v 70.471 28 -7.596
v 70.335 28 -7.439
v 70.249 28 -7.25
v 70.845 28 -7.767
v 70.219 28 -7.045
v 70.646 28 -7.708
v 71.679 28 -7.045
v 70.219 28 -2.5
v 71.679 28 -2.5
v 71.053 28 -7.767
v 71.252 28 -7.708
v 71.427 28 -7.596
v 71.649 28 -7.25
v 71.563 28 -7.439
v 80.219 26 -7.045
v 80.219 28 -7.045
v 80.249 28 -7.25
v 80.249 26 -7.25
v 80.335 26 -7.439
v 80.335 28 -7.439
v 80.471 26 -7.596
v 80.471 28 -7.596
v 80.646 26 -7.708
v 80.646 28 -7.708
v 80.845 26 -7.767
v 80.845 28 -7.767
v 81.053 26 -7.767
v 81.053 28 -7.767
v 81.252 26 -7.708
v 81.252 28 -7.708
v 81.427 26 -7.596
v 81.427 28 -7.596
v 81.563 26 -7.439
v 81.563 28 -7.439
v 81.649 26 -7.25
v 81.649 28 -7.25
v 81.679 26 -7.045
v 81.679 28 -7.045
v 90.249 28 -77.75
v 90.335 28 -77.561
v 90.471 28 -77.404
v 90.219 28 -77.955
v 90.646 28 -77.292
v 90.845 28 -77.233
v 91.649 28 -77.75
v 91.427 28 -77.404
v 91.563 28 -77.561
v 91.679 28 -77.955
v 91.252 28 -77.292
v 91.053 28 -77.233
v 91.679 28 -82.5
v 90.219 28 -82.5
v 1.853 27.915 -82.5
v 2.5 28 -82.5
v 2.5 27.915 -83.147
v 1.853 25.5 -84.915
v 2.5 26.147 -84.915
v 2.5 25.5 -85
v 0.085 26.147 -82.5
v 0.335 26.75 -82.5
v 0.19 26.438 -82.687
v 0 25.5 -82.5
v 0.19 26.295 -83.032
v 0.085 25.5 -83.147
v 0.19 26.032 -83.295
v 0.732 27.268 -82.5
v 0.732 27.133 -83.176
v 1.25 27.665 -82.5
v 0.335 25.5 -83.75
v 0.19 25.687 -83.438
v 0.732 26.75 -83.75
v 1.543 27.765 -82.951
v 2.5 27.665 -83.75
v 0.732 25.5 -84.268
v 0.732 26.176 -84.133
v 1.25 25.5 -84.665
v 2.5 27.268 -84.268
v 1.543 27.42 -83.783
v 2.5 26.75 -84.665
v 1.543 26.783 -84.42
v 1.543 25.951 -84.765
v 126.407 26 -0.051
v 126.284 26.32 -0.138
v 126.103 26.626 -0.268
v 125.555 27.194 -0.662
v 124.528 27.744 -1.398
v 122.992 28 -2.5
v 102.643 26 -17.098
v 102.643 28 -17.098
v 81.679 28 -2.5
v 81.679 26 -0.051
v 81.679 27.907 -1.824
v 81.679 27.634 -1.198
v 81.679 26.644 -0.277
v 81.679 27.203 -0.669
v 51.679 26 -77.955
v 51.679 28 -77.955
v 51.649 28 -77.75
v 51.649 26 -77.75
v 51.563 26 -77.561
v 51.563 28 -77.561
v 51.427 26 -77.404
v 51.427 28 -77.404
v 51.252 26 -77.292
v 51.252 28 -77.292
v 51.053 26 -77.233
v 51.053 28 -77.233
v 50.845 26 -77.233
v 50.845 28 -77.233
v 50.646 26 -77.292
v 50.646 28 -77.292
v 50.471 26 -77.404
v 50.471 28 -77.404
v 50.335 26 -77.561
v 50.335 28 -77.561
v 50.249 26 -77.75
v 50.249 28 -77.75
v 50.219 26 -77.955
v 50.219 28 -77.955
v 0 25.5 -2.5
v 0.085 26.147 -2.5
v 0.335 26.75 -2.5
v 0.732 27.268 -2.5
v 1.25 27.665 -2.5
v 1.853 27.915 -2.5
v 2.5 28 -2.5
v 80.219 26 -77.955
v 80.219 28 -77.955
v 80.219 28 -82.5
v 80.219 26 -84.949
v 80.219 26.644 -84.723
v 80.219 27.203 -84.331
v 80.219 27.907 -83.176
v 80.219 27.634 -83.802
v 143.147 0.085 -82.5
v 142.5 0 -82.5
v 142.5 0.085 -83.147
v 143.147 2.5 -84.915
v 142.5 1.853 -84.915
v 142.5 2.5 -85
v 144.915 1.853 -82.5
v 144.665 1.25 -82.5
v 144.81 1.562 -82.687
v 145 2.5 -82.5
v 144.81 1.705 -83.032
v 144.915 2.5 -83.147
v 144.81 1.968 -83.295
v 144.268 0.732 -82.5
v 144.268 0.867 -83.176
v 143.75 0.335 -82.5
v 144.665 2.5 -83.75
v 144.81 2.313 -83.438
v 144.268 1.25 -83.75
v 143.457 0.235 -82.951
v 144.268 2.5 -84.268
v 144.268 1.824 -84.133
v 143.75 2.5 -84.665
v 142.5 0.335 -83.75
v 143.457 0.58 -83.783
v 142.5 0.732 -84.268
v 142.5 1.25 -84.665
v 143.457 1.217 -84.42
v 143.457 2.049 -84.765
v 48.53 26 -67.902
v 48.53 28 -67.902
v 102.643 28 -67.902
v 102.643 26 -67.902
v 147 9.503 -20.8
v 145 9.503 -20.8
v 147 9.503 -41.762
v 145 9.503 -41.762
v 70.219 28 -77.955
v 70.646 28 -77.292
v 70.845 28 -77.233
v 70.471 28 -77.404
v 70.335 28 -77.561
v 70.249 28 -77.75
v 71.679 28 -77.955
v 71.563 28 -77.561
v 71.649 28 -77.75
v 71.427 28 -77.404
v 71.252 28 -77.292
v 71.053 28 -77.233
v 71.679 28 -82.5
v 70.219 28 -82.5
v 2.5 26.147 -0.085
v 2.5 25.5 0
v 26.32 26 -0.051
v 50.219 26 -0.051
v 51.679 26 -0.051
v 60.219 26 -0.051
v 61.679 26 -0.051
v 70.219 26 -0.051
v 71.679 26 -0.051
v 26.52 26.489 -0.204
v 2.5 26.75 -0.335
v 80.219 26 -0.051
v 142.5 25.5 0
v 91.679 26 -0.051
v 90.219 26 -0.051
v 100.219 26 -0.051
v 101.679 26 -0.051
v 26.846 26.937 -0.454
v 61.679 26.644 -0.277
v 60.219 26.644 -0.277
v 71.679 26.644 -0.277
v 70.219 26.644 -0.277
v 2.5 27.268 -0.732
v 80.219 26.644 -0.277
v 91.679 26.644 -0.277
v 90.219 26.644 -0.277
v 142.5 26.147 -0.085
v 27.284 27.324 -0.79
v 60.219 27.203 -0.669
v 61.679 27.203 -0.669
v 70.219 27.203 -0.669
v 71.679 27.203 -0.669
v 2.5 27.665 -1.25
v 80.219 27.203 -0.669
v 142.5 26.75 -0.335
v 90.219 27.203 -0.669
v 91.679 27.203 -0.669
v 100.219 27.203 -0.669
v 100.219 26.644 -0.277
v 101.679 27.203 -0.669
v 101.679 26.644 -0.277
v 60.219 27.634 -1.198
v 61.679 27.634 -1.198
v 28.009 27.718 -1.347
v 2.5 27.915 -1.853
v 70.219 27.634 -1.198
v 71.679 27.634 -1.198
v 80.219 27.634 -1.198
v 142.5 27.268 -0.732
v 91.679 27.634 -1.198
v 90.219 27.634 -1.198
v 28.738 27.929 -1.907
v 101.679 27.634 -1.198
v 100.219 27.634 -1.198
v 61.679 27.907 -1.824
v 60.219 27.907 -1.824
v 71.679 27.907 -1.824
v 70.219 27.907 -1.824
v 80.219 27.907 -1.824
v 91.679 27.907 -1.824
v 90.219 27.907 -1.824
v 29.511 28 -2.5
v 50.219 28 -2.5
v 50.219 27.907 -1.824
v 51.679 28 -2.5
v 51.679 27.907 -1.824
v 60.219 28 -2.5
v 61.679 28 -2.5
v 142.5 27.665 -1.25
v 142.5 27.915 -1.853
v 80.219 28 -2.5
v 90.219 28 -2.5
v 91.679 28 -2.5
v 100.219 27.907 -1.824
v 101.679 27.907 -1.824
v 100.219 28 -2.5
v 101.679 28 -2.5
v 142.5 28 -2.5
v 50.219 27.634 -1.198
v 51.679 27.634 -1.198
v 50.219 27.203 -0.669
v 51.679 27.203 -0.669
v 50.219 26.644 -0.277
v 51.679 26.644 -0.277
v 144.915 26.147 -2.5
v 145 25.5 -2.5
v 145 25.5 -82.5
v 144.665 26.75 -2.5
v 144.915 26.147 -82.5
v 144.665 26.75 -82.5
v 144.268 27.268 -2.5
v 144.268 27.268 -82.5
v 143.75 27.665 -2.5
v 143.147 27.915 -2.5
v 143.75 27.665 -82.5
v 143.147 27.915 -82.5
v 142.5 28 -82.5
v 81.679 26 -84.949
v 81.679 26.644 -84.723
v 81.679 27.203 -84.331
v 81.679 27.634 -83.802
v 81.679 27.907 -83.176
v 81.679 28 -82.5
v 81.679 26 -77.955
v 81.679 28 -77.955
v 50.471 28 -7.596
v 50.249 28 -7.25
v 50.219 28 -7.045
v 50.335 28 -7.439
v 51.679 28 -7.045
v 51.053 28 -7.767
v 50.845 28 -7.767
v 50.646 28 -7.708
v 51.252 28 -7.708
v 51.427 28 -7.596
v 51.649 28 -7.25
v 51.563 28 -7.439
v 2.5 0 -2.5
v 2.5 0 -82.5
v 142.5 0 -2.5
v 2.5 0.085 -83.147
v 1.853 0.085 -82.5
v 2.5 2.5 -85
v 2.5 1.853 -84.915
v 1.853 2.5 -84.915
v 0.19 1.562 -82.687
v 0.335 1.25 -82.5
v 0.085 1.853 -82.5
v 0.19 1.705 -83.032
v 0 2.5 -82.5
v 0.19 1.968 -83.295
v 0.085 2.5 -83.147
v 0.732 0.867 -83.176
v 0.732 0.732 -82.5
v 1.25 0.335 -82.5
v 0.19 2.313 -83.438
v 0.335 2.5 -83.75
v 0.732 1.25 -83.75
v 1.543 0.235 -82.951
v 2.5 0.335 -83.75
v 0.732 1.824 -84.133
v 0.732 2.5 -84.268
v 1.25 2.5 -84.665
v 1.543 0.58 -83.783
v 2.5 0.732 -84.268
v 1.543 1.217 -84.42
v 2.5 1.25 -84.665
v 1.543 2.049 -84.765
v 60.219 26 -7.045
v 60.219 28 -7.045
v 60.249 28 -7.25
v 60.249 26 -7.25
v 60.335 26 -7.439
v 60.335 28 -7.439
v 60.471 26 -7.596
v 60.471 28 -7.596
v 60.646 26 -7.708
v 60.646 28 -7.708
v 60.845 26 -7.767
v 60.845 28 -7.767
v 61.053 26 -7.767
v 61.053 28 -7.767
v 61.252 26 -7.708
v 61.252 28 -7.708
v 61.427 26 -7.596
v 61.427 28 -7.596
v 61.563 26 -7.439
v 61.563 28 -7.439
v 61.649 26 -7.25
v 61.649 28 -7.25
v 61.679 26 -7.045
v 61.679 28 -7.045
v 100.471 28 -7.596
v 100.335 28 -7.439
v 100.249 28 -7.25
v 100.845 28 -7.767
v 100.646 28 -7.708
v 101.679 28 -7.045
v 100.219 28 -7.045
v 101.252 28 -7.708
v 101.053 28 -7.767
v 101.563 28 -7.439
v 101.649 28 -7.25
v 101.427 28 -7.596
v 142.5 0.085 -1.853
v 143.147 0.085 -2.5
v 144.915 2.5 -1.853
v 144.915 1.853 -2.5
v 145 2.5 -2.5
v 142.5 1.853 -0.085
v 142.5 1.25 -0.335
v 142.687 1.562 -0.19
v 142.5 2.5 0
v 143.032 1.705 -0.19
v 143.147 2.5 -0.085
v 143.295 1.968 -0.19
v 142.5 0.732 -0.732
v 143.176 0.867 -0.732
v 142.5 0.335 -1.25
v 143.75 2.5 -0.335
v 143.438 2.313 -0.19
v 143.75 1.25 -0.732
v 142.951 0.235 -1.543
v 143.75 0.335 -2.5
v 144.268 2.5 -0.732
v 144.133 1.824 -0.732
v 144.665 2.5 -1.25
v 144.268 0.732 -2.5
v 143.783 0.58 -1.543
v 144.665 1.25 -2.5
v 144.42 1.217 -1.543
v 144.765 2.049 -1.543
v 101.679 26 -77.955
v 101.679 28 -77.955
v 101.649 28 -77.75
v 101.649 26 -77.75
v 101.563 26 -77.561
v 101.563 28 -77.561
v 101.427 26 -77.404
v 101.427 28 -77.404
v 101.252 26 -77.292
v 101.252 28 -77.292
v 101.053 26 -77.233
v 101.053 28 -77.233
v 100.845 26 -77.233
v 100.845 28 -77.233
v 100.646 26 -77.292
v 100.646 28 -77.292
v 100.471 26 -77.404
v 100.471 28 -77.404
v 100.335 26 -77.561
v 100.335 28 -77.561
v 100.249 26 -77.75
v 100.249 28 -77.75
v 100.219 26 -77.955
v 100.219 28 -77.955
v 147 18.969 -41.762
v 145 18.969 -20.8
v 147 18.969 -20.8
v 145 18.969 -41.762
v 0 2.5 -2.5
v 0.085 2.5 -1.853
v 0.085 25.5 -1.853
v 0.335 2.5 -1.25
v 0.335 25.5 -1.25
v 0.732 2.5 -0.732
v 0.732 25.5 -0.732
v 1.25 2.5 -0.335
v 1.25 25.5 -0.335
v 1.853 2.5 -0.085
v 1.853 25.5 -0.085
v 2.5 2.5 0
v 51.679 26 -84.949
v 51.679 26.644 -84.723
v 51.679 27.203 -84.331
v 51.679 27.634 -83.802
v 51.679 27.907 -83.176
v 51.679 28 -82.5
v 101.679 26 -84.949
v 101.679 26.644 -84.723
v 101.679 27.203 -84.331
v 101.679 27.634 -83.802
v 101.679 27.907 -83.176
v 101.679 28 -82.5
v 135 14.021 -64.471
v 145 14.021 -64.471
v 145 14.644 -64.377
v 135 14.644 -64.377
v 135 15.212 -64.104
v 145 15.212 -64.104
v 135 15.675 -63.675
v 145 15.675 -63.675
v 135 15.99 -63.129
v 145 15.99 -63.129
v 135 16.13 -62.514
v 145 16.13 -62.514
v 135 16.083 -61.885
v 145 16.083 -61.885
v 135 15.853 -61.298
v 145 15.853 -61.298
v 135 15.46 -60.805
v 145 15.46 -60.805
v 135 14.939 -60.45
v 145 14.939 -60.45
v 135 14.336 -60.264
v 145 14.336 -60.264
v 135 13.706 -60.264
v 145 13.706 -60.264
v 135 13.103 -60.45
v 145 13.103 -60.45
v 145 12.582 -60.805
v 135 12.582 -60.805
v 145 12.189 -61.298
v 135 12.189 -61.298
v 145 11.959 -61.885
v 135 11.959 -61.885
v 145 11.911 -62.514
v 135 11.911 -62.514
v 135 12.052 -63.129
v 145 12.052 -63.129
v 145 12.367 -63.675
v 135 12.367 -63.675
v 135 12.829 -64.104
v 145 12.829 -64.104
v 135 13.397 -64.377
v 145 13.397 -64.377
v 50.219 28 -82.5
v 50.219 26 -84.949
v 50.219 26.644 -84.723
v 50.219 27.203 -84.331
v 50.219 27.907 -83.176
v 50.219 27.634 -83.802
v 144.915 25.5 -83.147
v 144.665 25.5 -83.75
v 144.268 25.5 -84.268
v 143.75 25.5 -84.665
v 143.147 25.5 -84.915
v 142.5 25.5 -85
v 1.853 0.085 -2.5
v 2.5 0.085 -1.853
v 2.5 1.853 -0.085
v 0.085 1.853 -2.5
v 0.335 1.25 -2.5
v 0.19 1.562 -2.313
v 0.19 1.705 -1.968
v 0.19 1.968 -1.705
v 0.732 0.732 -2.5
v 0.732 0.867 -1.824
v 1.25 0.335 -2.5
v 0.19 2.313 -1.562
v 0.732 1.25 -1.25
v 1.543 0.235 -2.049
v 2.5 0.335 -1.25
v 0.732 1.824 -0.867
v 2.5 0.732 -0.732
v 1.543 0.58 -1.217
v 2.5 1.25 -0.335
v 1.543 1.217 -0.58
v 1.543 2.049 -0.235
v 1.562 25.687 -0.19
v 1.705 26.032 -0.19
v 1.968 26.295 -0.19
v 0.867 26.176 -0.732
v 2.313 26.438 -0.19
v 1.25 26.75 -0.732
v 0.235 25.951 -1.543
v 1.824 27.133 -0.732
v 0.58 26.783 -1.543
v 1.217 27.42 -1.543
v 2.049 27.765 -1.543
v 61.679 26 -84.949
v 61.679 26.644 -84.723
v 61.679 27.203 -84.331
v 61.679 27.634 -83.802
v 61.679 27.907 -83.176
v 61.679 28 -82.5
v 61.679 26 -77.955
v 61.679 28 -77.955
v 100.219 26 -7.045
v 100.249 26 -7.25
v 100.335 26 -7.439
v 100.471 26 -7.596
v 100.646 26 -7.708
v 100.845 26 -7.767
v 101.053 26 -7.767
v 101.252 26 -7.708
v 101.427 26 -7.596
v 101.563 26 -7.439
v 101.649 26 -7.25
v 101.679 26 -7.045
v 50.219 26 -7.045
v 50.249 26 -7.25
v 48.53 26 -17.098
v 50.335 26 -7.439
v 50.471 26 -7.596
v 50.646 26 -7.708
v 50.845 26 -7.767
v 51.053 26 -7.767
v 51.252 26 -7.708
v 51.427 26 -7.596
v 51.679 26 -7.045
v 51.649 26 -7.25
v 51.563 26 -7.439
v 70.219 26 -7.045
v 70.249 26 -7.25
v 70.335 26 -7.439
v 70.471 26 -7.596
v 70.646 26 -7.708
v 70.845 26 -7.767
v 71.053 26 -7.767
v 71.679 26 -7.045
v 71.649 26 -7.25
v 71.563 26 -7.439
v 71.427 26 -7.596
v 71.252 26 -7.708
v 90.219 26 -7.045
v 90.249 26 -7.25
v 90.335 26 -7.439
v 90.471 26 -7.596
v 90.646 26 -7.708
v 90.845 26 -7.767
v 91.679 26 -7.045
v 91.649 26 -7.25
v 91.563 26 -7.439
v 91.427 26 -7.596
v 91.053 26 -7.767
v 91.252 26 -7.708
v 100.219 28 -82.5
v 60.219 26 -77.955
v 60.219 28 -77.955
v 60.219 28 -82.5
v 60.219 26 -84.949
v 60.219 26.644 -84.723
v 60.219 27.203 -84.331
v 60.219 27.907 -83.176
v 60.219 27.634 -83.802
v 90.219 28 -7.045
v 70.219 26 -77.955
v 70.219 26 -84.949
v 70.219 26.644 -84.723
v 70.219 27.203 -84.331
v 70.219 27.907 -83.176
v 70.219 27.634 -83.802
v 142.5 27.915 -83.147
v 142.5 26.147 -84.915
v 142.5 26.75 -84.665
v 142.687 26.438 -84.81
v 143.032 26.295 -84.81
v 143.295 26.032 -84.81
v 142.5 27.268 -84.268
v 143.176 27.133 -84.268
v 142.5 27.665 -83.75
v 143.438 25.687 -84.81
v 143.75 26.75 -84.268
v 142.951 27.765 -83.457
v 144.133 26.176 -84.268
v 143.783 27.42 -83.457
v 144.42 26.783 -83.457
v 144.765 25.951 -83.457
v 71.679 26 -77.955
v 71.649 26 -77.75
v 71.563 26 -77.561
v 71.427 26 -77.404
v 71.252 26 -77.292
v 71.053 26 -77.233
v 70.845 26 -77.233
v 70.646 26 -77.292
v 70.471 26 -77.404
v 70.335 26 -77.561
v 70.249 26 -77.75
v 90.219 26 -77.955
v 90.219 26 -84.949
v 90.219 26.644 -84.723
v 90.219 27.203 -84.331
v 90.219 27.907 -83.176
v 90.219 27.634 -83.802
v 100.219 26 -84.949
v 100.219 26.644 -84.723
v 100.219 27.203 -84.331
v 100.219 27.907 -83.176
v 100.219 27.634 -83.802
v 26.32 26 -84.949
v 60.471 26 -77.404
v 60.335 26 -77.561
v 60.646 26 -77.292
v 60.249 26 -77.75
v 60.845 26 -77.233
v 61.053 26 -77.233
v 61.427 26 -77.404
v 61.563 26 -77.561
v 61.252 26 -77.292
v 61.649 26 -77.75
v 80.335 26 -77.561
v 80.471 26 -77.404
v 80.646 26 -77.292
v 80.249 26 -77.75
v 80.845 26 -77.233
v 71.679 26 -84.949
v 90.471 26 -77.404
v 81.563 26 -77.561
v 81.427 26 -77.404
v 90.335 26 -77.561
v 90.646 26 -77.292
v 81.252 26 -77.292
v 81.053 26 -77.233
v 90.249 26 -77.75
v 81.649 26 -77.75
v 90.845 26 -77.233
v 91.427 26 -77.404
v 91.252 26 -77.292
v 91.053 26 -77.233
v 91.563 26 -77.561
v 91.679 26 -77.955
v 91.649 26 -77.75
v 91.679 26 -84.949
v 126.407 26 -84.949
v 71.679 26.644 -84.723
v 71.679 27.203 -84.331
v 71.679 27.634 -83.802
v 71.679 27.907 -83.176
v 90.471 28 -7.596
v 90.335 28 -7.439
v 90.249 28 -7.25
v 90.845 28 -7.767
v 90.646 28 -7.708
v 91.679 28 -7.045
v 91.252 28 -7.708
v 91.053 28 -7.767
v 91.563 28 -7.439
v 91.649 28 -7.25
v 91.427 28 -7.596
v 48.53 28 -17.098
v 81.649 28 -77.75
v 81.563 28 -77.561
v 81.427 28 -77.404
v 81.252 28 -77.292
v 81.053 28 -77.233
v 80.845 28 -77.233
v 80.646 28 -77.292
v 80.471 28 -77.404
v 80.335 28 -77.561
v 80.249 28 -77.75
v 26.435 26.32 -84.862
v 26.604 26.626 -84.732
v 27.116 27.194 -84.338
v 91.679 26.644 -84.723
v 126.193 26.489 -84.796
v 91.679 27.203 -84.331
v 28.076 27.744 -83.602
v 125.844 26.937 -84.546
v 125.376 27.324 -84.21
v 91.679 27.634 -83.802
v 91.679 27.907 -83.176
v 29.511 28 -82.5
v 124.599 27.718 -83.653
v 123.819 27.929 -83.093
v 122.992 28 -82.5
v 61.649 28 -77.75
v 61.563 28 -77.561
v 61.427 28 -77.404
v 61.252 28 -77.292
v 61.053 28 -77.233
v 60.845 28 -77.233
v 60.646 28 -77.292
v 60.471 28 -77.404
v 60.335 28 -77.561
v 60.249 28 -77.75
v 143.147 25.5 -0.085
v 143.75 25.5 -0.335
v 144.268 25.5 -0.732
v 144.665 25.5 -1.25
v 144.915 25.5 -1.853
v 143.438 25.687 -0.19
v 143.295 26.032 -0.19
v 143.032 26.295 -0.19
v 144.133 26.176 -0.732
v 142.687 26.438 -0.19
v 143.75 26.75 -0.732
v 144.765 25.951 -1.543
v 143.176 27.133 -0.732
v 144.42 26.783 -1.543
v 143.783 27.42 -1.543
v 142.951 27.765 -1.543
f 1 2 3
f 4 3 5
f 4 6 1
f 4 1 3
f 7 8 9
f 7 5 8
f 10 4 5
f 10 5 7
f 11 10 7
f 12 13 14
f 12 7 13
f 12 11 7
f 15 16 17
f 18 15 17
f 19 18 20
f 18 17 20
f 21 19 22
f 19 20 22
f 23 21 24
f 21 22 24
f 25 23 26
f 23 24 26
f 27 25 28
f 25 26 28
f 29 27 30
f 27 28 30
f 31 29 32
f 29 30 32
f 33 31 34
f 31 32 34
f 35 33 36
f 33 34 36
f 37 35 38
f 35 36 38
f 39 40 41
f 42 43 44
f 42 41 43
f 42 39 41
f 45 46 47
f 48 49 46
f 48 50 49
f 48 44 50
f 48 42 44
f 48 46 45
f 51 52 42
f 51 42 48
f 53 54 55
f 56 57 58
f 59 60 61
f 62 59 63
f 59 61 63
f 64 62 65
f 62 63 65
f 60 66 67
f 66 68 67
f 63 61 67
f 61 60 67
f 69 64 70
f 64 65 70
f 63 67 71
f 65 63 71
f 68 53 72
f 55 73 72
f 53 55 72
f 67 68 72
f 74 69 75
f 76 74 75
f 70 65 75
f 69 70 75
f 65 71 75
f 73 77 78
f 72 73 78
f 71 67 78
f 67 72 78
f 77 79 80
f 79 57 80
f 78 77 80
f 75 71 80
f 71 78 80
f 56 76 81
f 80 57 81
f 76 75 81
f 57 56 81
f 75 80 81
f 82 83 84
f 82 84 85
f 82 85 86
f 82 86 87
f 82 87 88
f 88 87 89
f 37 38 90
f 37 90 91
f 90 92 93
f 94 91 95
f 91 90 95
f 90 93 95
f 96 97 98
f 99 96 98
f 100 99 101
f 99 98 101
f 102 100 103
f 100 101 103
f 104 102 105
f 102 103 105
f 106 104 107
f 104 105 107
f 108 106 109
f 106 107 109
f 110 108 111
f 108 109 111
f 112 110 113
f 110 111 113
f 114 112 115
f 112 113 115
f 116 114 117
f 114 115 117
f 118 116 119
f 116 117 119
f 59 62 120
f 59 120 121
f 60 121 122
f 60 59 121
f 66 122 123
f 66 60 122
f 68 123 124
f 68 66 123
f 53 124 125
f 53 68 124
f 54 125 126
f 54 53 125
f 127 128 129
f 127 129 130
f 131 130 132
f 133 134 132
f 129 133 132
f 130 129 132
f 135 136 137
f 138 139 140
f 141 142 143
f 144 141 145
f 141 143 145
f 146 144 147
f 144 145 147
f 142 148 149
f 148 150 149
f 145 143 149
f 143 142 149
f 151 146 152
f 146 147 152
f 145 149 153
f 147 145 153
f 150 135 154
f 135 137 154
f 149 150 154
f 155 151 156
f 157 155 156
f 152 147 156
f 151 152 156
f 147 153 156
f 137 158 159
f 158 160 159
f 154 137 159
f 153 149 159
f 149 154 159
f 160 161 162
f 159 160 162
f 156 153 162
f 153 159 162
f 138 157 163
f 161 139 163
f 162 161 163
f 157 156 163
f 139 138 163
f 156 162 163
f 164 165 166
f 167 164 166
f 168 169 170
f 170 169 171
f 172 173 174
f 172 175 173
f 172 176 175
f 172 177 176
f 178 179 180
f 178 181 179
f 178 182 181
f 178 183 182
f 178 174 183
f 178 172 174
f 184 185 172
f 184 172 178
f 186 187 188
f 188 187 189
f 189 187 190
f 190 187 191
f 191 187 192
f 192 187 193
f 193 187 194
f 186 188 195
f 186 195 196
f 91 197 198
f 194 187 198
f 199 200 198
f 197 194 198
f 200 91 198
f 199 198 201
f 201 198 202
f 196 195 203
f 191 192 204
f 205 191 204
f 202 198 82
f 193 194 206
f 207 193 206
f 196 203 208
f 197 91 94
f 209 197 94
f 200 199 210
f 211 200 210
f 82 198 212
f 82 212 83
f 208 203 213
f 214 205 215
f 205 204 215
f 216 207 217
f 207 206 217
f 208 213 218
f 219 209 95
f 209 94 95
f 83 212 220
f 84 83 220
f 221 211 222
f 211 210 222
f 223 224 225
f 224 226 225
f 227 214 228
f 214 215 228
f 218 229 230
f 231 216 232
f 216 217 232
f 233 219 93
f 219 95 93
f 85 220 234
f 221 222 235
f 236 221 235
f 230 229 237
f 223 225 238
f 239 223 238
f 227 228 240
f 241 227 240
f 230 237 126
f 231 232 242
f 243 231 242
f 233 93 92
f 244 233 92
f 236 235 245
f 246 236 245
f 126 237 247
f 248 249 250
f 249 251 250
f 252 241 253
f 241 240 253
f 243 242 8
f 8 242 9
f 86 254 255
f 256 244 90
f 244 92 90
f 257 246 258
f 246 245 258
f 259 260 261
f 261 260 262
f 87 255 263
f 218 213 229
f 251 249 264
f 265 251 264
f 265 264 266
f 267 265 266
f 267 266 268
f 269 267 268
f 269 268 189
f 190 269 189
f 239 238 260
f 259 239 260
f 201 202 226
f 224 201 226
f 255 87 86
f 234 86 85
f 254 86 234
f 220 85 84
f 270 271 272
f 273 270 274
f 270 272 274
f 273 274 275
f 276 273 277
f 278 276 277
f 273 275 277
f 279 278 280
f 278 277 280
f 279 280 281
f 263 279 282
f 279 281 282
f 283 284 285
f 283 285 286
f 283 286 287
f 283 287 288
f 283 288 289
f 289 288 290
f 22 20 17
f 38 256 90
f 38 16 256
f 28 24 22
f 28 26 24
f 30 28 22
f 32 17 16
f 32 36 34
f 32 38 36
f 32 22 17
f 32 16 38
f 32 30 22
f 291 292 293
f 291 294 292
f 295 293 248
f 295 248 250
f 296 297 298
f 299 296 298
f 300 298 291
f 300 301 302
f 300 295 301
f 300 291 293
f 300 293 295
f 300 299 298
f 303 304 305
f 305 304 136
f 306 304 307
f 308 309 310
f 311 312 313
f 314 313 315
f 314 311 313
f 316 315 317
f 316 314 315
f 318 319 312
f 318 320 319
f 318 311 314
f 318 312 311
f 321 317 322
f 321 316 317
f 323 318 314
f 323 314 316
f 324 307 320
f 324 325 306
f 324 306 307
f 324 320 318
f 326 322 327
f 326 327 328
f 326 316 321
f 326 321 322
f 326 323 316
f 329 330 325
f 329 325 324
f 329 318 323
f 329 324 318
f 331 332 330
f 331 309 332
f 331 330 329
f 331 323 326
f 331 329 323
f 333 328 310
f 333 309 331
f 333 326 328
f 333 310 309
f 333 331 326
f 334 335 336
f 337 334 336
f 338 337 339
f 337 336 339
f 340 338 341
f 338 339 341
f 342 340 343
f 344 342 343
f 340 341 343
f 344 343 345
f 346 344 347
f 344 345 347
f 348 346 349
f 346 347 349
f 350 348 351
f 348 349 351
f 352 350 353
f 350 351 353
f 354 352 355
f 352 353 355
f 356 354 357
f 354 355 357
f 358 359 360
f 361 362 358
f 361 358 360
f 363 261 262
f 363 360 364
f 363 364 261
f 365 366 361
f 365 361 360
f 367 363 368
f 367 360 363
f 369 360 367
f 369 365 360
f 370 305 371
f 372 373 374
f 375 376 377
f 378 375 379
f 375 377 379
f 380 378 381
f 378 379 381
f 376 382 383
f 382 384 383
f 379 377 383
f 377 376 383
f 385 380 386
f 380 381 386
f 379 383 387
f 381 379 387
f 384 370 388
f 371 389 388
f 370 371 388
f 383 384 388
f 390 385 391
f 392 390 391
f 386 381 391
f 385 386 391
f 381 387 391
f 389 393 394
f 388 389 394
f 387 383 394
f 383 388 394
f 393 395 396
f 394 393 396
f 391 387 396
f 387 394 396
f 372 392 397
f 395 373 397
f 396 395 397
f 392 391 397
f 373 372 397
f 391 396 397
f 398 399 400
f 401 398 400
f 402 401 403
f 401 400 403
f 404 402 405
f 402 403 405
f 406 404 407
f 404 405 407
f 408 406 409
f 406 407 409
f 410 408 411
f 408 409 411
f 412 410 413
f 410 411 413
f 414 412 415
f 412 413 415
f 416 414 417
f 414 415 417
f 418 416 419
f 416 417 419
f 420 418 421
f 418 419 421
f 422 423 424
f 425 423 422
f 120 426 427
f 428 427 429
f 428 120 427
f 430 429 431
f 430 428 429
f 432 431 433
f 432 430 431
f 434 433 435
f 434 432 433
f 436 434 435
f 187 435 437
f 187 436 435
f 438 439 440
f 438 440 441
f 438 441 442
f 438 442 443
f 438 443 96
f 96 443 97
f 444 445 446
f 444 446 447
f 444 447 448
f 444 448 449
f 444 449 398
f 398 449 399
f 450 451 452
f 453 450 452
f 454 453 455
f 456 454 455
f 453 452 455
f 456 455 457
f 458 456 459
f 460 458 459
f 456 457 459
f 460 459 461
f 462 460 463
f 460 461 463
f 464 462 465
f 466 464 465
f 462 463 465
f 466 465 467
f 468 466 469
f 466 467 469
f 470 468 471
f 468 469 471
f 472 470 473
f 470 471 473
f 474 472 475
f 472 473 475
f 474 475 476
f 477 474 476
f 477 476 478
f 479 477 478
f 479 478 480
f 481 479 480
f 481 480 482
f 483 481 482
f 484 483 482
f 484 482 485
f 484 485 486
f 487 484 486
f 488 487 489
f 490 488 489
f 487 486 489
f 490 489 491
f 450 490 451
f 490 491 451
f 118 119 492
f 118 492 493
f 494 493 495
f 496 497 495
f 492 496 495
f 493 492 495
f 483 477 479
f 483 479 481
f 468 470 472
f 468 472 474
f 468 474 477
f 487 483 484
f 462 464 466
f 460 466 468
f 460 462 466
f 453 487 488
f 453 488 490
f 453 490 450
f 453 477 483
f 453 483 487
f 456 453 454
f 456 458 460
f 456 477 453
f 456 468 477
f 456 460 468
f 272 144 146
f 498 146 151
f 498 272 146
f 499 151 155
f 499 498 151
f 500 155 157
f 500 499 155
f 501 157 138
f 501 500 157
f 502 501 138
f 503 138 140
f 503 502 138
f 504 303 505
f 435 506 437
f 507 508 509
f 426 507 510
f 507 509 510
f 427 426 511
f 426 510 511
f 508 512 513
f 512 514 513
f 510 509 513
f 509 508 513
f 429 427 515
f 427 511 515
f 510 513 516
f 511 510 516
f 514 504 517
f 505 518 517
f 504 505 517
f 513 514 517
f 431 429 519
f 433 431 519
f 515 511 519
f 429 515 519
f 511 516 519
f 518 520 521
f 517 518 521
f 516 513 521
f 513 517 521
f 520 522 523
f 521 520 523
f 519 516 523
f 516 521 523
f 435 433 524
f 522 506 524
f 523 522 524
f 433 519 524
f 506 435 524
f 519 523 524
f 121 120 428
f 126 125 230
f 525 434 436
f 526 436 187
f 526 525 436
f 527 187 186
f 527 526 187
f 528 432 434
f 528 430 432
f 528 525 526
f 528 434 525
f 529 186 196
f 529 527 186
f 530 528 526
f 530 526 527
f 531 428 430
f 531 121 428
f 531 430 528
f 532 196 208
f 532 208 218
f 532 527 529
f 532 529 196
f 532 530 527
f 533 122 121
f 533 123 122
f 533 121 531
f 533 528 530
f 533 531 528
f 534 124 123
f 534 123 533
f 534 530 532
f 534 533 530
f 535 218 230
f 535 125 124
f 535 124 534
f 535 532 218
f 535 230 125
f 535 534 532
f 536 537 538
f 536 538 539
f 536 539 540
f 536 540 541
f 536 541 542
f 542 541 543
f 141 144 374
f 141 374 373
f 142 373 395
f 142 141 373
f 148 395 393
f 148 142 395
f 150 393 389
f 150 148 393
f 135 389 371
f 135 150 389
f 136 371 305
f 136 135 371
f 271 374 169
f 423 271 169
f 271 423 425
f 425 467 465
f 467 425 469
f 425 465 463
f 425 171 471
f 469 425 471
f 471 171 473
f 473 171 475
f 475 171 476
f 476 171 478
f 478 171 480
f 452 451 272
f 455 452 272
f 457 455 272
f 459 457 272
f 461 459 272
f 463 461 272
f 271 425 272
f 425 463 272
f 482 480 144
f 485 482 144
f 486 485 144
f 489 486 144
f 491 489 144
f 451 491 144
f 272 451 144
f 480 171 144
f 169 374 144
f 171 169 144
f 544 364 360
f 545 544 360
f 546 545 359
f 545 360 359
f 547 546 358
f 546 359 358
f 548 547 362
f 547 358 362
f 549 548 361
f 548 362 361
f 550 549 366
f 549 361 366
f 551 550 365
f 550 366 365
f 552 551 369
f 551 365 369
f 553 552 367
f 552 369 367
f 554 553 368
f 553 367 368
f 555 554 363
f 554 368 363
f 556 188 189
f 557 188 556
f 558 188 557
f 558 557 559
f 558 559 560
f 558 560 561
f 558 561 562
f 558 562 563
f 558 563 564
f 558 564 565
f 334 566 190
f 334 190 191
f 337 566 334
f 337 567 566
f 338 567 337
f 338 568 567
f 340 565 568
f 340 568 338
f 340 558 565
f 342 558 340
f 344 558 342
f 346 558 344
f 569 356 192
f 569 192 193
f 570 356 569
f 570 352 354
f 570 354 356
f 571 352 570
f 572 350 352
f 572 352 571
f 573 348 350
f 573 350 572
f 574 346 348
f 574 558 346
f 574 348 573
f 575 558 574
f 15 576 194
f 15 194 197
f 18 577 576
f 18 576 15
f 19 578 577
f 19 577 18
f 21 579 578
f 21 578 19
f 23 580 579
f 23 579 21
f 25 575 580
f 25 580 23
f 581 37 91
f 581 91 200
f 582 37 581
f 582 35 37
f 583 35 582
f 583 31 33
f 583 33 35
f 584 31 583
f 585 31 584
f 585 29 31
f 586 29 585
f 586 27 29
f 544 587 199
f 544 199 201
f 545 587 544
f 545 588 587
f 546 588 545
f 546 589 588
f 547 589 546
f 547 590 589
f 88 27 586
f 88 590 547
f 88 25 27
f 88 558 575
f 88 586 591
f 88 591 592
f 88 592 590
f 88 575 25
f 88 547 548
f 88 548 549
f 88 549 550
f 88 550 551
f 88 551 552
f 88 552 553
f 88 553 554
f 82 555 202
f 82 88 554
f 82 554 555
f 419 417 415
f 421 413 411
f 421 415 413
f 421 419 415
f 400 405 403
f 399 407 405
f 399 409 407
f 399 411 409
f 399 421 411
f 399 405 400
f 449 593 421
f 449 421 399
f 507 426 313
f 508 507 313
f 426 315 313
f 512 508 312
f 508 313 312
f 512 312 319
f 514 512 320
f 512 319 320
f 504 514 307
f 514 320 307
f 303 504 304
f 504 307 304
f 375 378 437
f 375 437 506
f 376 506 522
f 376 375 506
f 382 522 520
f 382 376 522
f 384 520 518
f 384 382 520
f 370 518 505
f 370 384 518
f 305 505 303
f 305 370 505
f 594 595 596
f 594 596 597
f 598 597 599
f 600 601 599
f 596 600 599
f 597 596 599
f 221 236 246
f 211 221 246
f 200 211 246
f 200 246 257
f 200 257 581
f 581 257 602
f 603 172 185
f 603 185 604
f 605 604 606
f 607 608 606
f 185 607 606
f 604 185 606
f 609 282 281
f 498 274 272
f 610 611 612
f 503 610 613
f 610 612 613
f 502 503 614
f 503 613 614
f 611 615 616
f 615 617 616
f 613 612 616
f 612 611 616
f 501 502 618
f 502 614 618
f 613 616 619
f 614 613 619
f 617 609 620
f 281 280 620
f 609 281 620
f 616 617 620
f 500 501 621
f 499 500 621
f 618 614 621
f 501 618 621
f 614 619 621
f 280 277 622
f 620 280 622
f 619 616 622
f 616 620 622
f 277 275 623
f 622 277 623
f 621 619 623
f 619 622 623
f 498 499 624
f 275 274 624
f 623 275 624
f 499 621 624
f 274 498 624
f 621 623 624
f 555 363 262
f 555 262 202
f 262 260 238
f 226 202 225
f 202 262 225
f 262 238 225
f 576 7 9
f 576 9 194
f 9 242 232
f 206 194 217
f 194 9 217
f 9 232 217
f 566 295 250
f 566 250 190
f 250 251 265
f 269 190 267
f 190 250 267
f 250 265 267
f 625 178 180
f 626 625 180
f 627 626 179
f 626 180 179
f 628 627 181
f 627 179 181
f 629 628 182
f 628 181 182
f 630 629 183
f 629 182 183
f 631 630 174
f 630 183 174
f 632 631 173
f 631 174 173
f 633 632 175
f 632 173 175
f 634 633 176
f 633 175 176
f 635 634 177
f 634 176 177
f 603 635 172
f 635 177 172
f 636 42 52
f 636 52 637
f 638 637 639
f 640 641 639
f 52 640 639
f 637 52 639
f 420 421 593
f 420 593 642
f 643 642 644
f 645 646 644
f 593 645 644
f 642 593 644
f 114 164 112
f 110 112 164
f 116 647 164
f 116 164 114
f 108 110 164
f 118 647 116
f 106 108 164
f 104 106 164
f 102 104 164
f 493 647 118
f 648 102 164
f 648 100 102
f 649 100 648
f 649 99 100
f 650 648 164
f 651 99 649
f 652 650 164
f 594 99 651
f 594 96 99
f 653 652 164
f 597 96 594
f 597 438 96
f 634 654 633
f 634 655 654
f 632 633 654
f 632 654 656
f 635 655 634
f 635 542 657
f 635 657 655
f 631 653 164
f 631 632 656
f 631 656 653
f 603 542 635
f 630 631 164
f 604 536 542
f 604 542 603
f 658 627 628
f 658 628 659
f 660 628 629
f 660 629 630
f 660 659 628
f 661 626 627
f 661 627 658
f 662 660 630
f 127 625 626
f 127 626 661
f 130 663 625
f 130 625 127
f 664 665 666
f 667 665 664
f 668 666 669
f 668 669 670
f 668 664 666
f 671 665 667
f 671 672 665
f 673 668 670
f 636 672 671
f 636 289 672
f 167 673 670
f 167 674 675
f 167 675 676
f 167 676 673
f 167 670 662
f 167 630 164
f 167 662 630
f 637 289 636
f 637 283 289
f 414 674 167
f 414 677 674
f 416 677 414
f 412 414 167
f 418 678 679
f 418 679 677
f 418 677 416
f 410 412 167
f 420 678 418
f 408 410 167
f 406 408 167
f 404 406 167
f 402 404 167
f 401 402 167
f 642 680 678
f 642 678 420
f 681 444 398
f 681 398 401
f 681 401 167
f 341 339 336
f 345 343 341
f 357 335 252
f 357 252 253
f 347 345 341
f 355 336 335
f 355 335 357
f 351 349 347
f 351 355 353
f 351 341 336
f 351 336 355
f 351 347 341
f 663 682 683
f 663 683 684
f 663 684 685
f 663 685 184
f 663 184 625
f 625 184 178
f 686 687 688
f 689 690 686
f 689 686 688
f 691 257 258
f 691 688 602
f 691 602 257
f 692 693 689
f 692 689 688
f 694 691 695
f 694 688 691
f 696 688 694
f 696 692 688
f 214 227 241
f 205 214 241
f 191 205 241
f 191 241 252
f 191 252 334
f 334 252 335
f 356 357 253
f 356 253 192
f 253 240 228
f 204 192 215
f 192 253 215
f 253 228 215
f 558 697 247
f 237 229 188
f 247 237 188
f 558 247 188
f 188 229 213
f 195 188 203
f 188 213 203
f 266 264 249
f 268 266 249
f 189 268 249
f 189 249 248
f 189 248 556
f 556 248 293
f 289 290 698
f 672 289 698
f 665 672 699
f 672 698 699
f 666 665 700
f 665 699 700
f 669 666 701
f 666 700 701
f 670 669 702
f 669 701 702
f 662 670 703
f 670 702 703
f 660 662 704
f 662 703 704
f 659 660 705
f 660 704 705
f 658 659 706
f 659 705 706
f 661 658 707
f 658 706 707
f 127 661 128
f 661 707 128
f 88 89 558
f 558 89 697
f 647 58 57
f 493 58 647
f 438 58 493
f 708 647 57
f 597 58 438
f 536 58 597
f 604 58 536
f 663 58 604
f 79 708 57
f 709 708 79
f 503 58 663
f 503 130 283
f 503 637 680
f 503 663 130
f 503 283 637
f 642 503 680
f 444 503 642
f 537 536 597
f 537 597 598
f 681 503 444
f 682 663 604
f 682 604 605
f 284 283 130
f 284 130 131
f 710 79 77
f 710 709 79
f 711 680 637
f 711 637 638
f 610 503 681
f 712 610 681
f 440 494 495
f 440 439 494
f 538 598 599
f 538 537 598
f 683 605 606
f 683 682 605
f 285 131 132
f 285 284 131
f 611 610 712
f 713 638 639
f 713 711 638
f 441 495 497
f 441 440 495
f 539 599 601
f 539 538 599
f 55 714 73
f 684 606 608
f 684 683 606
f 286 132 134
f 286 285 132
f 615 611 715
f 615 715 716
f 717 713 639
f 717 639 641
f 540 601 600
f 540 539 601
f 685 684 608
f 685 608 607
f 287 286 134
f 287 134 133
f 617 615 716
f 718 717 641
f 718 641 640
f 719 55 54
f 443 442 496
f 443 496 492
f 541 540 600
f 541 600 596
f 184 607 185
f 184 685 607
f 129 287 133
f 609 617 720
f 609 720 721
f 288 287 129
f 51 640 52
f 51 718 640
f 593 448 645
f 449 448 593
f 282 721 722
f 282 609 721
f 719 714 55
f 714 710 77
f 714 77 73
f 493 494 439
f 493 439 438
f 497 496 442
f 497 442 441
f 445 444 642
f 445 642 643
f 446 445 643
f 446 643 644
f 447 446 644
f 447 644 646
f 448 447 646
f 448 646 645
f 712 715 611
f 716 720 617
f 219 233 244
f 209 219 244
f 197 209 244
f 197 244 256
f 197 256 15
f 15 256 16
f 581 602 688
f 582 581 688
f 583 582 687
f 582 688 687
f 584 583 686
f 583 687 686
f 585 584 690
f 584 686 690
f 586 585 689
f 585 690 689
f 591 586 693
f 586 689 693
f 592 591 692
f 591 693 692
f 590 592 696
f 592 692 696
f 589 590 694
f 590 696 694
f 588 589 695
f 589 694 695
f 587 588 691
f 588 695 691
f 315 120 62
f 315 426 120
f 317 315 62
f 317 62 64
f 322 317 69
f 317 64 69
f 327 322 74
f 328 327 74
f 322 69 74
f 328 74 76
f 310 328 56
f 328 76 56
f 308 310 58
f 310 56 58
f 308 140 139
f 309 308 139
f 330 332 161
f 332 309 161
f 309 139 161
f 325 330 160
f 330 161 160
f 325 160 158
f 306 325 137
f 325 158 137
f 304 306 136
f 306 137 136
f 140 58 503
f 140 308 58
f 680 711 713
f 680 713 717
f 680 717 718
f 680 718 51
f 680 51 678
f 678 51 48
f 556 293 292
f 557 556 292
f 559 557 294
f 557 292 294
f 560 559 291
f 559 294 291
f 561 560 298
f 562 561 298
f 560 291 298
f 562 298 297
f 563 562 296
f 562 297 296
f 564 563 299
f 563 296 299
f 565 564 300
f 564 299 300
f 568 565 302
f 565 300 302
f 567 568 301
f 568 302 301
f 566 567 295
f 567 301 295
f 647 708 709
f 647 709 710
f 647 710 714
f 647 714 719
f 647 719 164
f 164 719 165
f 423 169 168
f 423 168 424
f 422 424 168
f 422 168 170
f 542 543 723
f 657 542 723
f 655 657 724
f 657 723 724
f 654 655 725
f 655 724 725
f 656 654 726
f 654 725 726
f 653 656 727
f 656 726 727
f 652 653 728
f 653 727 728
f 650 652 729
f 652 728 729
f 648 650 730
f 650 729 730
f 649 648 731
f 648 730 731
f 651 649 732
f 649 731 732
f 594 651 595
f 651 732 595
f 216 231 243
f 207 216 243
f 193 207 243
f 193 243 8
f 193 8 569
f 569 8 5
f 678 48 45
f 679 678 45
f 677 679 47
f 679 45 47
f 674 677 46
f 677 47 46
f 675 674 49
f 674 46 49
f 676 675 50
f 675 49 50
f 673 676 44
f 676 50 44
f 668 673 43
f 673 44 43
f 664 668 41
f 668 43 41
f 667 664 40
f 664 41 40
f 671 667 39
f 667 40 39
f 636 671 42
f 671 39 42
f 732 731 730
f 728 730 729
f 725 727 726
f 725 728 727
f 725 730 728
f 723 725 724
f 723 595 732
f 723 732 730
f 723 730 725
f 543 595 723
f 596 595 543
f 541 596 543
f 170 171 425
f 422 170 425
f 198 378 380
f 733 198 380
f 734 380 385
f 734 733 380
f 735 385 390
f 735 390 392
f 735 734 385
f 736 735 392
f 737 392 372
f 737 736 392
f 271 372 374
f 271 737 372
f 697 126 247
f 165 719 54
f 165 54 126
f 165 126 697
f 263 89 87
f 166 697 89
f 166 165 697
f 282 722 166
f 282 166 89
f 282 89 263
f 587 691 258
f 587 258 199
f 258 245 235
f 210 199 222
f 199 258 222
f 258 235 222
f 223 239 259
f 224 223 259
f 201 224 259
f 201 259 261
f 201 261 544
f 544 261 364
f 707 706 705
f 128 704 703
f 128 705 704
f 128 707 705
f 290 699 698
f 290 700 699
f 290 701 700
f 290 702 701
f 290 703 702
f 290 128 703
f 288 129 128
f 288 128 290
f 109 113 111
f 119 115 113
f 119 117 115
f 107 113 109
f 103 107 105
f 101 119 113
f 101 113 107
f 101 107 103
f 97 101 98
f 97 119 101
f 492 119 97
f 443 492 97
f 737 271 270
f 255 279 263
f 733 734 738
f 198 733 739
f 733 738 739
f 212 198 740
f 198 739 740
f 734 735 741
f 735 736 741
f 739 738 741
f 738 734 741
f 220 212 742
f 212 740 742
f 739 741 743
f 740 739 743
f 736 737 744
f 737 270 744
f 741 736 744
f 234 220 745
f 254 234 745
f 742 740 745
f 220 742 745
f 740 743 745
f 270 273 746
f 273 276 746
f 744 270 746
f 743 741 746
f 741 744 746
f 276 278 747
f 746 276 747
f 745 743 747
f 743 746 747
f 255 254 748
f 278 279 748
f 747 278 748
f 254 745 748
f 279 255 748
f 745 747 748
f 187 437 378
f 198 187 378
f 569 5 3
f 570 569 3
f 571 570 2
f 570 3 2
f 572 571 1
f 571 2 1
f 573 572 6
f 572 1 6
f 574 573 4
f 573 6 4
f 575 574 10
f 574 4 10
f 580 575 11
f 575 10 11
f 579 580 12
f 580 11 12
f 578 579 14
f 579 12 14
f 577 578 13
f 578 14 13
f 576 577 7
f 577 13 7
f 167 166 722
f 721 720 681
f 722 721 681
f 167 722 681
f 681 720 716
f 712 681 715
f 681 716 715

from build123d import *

# Parameters (mm, degrees)
SKETCH2_W           = 145
SKETCH2_H           = 85
BOSS_EXTRUDE1_DEPTH = 28
FILLET1_R           = 2.5
SKETCH3_R           = 2.115255866
CUT_EXTRUDE1_DEPTH  = 10
SKETCH4_W           = 20.962420857
SKETCH4_H           = 9.466899742
BOSS_EXTRUDE2_DEPTH = 2
CUT_EXTRUDE2_DEPTH  = 2


with BuildPart() as part:
    # Sketch2 → Boss-Extrude1 (new body)
    with BuildSketch(Plane(origin=(0, 0, 0), x_dir=(1, 0, 0), z_dir=(0, 1, 0))):
        with Locations((72.5, 42.5)):
            Rectangle(SKETCH2_W, SKETCH2_H)
    extrude(amount=BOSS_EXTRUDE1_DEPTH)

    # Fillet1
    fillet1_edges = [part.edges().sort_by_distance(p)[0] for p in [
        (145, 28, -42.5),
        (72.5, 28, -85),
        (0, 28, -42.5),
        (72.5, 0, -85),
        (145, 0, -42.5),
        (72.5, 0, 0),
        (0, 0, -42.5),
        (0, 14, -85),
        (145, 14, -85),
        (145, 14, 0),
        (0, 14, 0),
        (72.5, 28, 0),
    ]]
    fillet(fillet1_edges, radius=FILLET1_R)

    # Sketch3 → Cut-Extrude1 (cut)
    with BuildSketch(Plane(origin=(145, 0, 0), x_dir=(0, 0, -1), z_dir=(1, 0, 0))):
        with Locations((62.355900108, 14.02082484)):
            Circle(SKETCH3_R)
    extrude(amount=-CUT_EXTRUDE1_DEPTH, mode=Mode.SUBTRACT)

    # Sketch4 → Boss-Extrude2 (add)
    with BuildSketch(Plane(origin=(145, 0, 0), x_dir=(0, 0, -1), z_dir=(1, 0, 0))):
        with Locations((31.281109073, 14.236048875)):
            Rectangle(SKETCH4_W, SKETCH4_H)
    extrude(amount=BOSS_EXTRUDE2_DEPTH)

    # Sketch5 → Cut-Extrude2 (cut)
    with BuildSketch(Plane(origin=(0, 28, 0), x_dir=(1, 0, 0), z_dir=(0, 1, 0))):
        with BuildLine():
            Line((26.254495466, 85), (48.530276138, 67.90157817))
            Line((48.530276138, 67.90157817), (102.643480063, 67.90157817))
            Line((102.643480063, 67.90157817), (126.477007635, 85))
            Line((126.477007635, 85), (101.67856471, 85))
            Line((101.67856471, 85), (101.67856471, 77.955286257))
            ThreePointArc((101.67856471, 77.955286257), (100.949025715, 77.225747261), (100.21948672, 77.955286257))
            Line((100.21948672, 77.955286257), (100.21948672, 85))
            Line((100.21948672, 85), (91.67856471, 85))
            Line((91.67856471, 85), (91.67856471, 77.955286257))
            ThreePointArc((91.67856471, 77.955286257), (90.949025715, 77.225747261), (90.21948672, 77.955286257))
            Line((90.21948672, 77.955286257), (90.21948672, 85))
            Line((90.21948672, 85), (81.67856471, 85))
            Line((81.67856471, 85), (81.67856471, 77.955286257))
            ThreePointArc((81.67856471, 77.955286257), (80.949025715, 77.225747261), (80.21948672, 77.955286257))
            Line((80.21948672, 77.955286257), (80.21948672, 85))
            Line((80.21948672, 85), (71.67856471, 85))
            Line((71.67856471, 85), (71.67856471, 77.955286257))
            ThreePointArc((71.67856471, 77.955286257), (70.949025715, 77.225747261), (70.21948672, 77.955286257))
            Line((70.21948672, 77.955286257), (70.21948672, 85))
            Line((70.21948672, 85), (61.67856471, 85))
            Line((61.67856471, 85), (61.67856471, 77.955286257))
            ThreePointArc((61.67856471, 77.955286257), (60.949025715, 77.225747261), (60.21948672, 77.955286257))
            Line((60.21948672, 77.955286257), (60.21948672, 85))
            Line((60.21948672, 85), (51.67856471, 85))
            Line((51.67856471, 85), (51.67856471, 77.955286257))
            ThreePointArc((51.67856471, 77.955286257), (50.949025715, 77.225747261), (50.21948672, 77.955286257))
            Line((50.21948672, 77.955286257), (50.21948672, 85))
            Line((50.21948672, 85), (26.254495466, 85))
        make_face()
        with BuildLine():
            Line((101.67856471, 0), (126.477007635, 0))
            Line((126.477007635, 0), (102.643480063, 17.09842183))
            Line((102.643480063, 17.09842183), (48.530276138, 17.09842183))
            Line((48.530276138, 17.09842183), (26.254495466, 0))
            Line((26.254495466, 0), (50.21948672, 0))
            Line((50.21948672, 0), (50.21948672, 7.044713743))
            ThreePointArc((50.21948672, 7.044713743), (50.949025715, 7.774252739), (51.67856471, 7.044713743))
            Line((51.67856471, 7.044713743), (51.67856471, 0))
            Line((51.67856471, 0), (60.21948672, 0))
            Line((60.21948672, 0), (60.21948672, 7.044713743))
            ThreePointArc((60.21948672, 7.044713743), (60.949025715, 7.774252739), (61.67856471, 7.044713743))
            Line((61.67856471, 7.044713743), (61.67856471, 0))
            Line((61.67856471, 0), (70.21948672, 0))
            Line((70.21948672, 0), (70.21948672, 7.044713743))
            ThreePointArc((70.21948672, 7.044713743), (70.949025715, 7.774252739), (71.67856471, 7.044713743))
            Line((71.67856471, 7.044713743), (71.67856471, 0))
            Line((71.67856471, 0), (80.21948672, 0))
            Line((80.21948672, 0), (80.21948672, 7.044713743))
            ThreePointArc((80.21948672, 7.044713743), (80.949025715, 7.774252739), (81.67856471, 7.044713743))
            Line((81.67856471, 7.044713743), (81.67856471, 0))
            Line((81.67856471, 0), (90.21948672, 0))
            Line((90.21948672, 0), (90.21948672, 7.044713743))
            ThreePointArc((90.21948672, 7.044713743), (90.949025715, 7.774252739), (91.67856471, 7.044713743))
            Line((91.67856471, 7.044713743), (91.67856471, 0))
            Line((91.67856471, 0), (100.21948672, 0))
            Line((100.21948672, 0), (100.21948672, 7.044713743))
            ThreePointArc((100.21948672, 7.044713743), (100.949025715, 7.774252739), (101.67856471, 7.044713743))
            Line((101.67856471, 7.044713743), (101.67856471, 0))
        make_face()
    extrude(amount=-CUT_EXTRUDE2_DEPTH, mode=Mode.SUBTRACT)


solid = part.part
